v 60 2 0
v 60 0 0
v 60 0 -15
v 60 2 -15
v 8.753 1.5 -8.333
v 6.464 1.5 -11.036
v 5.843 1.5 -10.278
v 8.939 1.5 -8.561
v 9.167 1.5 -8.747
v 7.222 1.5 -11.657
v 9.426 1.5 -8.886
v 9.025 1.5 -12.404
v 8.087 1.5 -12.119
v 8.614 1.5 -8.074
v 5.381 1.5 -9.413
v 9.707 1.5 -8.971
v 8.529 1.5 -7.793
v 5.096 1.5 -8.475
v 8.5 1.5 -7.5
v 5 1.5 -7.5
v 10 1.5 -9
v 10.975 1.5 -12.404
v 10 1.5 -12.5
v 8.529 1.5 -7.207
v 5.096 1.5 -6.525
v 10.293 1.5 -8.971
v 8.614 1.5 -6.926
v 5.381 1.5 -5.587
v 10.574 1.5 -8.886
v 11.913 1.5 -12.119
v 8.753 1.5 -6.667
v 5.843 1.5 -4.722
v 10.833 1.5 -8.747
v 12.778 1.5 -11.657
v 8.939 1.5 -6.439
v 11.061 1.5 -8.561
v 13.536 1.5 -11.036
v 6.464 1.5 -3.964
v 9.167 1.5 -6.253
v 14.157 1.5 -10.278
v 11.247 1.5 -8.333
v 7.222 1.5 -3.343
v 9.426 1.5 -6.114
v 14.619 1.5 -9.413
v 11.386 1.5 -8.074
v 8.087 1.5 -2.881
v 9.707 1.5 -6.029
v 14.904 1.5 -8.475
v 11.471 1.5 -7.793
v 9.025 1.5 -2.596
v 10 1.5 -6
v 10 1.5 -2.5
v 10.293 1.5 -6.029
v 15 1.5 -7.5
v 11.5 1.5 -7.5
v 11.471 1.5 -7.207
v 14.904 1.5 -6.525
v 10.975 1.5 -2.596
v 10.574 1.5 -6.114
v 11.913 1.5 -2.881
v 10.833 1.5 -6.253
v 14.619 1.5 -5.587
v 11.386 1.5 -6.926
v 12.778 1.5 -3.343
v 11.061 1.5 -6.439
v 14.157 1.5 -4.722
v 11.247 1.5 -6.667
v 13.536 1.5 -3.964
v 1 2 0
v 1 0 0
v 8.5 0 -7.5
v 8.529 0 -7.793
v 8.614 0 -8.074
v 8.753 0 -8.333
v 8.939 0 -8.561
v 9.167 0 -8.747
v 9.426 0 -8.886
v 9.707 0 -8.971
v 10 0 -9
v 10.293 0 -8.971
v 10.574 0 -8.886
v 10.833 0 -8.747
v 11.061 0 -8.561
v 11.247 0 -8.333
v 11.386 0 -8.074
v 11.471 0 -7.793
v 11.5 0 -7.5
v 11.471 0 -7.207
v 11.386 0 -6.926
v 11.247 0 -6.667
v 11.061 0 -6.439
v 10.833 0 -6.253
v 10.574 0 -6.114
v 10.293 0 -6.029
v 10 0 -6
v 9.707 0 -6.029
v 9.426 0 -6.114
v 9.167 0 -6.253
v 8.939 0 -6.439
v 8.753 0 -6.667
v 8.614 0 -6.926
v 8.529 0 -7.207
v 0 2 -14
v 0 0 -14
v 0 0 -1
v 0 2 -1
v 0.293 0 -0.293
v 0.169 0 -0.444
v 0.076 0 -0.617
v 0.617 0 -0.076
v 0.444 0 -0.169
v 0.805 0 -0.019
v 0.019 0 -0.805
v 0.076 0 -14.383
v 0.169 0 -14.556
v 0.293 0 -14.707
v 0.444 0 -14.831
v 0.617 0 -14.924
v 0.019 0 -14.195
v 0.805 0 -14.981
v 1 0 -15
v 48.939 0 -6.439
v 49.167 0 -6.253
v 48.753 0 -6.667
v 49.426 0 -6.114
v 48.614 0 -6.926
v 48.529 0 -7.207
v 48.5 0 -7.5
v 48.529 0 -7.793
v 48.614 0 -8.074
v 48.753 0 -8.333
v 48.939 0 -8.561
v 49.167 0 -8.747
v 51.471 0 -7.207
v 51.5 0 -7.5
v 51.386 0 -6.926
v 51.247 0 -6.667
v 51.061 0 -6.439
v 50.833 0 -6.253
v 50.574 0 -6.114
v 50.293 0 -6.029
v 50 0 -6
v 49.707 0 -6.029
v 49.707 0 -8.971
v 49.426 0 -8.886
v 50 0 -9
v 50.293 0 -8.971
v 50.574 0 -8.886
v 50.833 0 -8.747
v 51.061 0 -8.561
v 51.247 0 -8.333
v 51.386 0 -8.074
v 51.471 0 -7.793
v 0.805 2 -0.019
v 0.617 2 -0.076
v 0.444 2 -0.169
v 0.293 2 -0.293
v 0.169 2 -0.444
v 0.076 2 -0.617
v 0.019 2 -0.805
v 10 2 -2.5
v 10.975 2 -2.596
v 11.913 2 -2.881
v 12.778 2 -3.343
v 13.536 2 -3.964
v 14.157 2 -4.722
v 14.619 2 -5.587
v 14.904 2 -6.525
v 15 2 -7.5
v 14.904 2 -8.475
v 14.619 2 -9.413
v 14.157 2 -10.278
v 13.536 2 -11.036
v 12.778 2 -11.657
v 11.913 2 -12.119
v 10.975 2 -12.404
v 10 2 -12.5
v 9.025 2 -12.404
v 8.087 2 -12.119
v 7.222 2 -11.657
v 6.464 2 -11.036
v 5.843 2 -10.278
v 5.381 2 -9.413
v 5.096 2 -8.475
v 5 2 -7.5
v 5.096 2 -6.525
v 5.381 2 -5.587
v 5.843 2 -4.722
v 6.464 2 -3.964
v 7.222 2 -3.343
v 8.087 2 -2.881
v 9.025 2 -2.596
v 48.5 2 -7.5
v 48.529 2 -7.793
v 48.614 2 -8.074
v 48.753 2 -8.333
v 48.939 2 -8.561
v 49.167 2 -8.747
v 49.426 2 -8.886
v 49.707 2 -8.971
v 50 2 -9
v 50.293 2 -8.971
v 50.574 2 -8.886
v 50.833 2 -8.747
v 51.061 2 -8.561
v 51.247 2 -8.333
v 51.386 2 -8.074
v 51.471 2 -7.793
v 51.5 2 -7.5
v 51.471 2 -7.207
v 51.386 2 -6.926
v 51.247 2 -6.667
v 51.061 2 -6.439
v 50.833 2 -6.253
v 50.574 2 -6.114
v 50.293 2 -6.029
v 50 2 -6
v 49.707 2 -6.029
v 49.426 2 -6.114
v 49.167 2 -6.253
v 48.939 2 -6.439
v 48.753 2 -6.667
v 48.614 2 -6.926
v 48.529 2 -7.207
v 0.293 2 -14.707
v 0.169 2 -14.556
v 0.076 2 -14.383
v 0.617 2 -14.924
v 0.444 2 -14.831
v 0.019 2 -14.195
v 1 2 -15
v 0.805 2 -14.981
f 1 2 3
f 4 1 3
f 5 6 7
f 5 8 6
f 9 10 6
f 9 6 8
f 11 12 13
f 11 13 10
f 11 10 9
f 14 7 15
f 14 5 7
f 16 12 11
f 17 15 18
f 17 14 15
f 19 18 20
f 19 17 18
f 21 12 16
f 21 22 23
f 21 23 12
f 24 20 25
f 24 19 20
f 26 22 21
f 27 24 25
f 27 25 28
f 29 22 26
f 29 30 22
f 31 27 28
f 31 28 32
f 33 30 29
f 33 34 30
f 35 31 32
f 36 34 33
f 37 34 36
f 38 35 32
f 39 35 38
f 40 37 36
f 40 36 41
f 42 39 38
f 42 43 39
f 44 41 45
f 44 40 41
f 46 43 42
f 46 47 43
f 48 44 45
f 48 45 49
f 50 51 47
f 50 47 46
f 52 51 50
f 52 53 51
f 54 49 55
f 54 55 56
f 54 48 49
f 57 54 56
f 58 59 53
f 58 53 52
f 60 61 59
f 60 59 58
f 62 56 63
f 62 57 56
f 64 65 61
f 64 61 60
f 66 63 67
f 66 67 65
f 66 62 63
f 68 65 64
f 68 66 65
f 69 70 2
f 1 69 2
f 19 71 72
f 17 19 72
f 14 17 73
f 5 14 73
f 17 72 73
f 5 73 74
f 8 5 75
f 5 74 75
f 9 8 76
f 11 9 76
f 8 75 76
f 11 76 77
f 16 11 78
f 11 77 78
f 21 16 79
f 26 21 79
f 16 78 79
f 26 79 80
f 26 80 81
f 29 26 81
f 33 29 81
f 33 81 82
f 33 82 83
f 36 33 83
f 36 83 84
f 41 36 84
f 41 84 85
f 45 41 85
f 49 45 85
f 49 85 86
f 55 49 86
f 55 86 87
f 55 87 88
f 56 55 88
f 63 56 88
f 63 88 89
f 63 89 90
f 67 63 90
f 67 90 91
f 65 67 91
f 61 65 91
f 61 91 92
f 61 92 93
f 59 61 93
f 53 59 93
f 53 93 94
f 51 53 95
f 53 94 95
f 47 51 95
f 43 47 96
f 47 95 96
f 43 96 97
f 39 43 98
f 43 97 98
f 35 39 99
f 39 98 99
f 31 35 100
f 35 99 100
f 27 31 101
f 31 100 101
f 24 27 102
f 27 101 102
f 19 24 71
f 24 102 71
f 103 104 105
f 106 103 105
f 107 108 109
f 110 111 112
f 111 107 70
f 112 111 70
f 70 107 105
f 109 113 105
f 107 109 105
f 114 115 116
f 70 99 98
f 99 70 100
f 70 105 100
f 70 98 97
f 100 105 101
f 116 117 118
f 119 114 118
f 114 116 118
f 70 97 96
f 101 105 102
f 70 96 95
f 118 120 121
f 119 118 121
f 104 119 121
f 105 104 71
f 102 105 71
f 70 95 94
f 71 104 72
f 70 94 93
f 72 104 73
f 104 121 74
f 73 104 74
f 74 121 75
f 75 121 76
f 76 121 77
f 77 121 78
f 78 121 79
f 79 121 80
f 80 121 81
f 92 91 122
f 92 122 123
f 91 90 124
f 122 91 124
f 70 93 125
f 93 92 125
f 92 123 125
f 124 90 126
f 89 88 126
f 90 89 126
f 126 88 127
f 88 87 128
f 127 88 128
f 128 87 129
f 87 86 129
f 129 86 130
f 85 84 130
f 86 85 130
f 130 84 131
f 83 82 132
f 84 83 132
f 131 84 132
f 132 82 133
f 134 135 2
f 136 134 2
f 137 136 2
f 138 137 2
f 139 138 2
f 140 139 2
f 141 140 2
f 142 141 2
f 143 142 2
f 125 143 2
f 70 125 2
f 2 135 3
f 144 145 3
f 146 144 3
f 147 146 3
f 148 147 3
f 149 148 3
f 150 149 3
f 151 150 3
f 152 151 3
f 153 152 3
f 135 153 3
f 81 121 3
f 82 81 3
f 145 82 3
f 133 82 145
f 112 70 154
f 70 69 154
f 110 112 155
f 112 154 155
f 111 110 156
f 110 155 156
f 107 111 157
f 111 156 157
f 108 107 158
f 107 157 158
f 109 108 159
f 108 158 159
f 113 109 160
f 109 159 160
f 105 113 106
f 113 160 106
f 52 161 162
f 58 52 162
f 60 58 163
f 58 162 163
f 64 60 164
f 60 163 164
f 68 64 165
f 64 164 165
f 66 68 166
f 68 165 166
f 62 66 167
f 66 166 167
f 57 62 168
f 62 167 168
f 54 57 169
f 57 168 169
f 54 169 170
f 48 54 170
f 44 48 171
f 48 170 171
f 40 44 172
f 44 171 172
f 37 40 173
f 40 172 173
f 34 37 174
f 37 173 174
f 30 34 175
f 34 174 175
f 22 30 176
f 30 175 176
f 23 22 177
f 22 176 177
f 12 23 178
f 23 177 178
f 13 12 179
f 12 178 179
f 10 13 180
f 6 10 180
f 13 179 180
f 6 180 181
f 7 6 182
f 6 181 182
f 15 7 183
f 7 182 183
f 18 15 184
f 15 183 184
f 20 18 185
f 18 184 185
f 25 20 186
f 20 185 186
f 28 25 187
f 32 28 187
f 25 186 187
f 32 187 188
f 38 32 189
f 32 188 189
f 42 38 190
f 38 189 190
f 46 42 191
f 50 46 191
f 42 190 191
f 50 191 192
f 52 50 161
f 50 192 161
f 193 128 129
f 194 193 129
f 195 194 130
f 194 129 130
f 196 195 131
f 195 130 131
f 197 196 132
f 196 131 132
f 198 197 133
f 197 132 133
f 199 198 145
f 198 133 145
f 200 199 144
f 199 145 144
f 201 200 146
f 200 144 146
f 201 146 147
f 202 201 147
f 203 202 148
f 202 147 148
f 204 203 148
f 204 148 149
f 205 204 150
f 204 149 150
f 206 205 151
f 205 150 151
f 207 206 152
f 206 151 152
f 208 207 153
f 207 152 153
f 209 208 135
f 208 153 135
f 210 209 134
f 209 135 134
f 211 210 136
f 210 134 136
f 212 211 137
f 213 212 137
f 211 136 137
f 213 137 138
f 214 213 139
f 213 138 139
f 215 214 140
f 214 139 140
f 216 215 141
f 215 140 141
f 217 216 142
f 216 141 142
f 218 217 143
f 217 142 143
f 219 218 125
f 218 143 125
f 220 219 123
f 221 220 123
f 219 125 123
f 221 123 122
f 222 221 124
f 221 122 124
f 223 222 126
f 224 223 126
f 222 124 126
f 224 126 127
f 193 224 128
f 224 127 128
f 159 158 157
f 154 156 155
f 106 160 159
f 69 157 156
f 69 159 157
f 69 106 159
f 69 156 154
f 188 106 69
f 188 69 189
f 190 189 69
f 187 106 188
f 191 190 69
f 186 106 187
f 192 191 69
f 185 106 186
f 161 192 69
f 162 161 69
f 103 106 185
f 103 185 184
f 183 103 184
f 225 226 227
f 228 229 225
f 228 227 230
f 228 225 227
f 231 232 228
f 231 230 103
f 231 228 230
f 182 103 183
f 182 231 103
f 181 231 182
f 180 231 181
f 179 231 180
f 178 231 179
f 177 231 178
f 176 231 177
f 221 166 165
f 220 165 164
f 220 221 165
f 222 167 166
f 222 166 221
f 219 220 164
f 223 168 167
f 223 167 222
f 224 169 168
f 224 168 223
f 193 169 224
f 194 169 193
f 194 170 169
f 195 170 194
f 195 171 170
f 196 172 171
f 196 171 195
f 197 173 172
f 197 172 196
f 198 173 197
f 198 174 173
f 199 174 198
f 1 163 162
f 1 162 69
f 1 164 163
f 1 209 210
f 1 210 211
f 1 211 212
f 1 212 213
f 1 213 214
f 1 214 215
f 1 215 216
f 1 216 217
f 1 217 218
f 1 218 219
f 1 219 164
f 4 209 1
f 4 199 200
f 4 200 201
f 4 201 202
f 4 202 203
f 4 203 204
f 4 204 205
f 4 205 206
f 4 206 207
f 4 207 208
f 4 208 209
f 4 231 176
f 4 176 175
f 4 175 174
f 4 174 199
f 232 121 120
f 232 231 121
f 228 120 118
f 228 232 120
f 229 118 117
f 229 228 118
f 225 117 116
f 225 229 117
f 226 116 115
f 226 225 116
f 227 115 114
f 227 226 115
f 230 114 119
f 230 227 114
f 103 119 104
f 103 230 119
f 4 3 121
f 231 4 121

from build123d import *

# Parameters (mm, degrees)
BOSS_EXTRUDE1_DEPTH = 2
SKETCH2_R           = 5
CUT_EXTRUDE1_DEPTH  = 0.5
FILLET1_R           = 1


with BuildPart() as part:
    # Sketch1 → Boss-Extrude1 (new body)
    with BuildSketch(Plane(origin=(0, 0, 0), x_dir=(1, 0, 0), z_dir=(0, 1, 0))):
        with BuildLine():
            Line((60, 7.5), (51.5, 7.5))
            ThreePointArc((51.5, 7.5), (50, 6), (48.5, 7.5))
            Line((48.5, 7.5), (11.5, 7.5))
            ThreePointArc((11.5, 7.5), (10, 6), (8.5, 7.5))
            Line((8.5, 7.5), (0, 7.5))
            Line((0, 7.5), (0, 0))
            Line((0, 0), (60, 0))
            Line((60, 0), (60, 7.5))
        make_face()
        with BuildLine():
            ThreePointArc((48.5, 7.5), (50, 9), (51.5, 7.5))
            Line((51.5, 7.5), (60, 7.5))
            Line((60, 7.5), (60, 15))
            Line((60, 15), (0, 15))
            Line((0, 15), (0, 7.5))
            Line((0, 7.5), (8.5, 7.5))
            ThreePointArc((8.5, 7.5), (10, 9), (11.5, 7.5))
            Line((11.5, 7.5), (48.5, 7.5))
        make_face()
    extrude(amount=BOSS_EXTRUDE1_DEPTH)

    # Sketch2 → Cut-Extrude1 (cut)
    with BuildSketch(Plane(origin=(0, 2, 0), x_dir=(1, 0, 0), z_dir=(0, 1, 0))):
        with Locations(Location((10, 7.5, 0), (0, 0, 270))):
            Circle(SKETCH2_R)
    extrude(amount=-CUT_EXTRUDE1_DEPTH, mode=Mode.SUBTRACT)

    # Fillet1
    fillet1_edges = [part.edges().sort_by_distance(p)[0] for p in [
        (0, 1, 0),
        (0, 1, -15),
    ]]
    fillet(fillet1_edges, radius=FILLET1_R)


solid = part.part
